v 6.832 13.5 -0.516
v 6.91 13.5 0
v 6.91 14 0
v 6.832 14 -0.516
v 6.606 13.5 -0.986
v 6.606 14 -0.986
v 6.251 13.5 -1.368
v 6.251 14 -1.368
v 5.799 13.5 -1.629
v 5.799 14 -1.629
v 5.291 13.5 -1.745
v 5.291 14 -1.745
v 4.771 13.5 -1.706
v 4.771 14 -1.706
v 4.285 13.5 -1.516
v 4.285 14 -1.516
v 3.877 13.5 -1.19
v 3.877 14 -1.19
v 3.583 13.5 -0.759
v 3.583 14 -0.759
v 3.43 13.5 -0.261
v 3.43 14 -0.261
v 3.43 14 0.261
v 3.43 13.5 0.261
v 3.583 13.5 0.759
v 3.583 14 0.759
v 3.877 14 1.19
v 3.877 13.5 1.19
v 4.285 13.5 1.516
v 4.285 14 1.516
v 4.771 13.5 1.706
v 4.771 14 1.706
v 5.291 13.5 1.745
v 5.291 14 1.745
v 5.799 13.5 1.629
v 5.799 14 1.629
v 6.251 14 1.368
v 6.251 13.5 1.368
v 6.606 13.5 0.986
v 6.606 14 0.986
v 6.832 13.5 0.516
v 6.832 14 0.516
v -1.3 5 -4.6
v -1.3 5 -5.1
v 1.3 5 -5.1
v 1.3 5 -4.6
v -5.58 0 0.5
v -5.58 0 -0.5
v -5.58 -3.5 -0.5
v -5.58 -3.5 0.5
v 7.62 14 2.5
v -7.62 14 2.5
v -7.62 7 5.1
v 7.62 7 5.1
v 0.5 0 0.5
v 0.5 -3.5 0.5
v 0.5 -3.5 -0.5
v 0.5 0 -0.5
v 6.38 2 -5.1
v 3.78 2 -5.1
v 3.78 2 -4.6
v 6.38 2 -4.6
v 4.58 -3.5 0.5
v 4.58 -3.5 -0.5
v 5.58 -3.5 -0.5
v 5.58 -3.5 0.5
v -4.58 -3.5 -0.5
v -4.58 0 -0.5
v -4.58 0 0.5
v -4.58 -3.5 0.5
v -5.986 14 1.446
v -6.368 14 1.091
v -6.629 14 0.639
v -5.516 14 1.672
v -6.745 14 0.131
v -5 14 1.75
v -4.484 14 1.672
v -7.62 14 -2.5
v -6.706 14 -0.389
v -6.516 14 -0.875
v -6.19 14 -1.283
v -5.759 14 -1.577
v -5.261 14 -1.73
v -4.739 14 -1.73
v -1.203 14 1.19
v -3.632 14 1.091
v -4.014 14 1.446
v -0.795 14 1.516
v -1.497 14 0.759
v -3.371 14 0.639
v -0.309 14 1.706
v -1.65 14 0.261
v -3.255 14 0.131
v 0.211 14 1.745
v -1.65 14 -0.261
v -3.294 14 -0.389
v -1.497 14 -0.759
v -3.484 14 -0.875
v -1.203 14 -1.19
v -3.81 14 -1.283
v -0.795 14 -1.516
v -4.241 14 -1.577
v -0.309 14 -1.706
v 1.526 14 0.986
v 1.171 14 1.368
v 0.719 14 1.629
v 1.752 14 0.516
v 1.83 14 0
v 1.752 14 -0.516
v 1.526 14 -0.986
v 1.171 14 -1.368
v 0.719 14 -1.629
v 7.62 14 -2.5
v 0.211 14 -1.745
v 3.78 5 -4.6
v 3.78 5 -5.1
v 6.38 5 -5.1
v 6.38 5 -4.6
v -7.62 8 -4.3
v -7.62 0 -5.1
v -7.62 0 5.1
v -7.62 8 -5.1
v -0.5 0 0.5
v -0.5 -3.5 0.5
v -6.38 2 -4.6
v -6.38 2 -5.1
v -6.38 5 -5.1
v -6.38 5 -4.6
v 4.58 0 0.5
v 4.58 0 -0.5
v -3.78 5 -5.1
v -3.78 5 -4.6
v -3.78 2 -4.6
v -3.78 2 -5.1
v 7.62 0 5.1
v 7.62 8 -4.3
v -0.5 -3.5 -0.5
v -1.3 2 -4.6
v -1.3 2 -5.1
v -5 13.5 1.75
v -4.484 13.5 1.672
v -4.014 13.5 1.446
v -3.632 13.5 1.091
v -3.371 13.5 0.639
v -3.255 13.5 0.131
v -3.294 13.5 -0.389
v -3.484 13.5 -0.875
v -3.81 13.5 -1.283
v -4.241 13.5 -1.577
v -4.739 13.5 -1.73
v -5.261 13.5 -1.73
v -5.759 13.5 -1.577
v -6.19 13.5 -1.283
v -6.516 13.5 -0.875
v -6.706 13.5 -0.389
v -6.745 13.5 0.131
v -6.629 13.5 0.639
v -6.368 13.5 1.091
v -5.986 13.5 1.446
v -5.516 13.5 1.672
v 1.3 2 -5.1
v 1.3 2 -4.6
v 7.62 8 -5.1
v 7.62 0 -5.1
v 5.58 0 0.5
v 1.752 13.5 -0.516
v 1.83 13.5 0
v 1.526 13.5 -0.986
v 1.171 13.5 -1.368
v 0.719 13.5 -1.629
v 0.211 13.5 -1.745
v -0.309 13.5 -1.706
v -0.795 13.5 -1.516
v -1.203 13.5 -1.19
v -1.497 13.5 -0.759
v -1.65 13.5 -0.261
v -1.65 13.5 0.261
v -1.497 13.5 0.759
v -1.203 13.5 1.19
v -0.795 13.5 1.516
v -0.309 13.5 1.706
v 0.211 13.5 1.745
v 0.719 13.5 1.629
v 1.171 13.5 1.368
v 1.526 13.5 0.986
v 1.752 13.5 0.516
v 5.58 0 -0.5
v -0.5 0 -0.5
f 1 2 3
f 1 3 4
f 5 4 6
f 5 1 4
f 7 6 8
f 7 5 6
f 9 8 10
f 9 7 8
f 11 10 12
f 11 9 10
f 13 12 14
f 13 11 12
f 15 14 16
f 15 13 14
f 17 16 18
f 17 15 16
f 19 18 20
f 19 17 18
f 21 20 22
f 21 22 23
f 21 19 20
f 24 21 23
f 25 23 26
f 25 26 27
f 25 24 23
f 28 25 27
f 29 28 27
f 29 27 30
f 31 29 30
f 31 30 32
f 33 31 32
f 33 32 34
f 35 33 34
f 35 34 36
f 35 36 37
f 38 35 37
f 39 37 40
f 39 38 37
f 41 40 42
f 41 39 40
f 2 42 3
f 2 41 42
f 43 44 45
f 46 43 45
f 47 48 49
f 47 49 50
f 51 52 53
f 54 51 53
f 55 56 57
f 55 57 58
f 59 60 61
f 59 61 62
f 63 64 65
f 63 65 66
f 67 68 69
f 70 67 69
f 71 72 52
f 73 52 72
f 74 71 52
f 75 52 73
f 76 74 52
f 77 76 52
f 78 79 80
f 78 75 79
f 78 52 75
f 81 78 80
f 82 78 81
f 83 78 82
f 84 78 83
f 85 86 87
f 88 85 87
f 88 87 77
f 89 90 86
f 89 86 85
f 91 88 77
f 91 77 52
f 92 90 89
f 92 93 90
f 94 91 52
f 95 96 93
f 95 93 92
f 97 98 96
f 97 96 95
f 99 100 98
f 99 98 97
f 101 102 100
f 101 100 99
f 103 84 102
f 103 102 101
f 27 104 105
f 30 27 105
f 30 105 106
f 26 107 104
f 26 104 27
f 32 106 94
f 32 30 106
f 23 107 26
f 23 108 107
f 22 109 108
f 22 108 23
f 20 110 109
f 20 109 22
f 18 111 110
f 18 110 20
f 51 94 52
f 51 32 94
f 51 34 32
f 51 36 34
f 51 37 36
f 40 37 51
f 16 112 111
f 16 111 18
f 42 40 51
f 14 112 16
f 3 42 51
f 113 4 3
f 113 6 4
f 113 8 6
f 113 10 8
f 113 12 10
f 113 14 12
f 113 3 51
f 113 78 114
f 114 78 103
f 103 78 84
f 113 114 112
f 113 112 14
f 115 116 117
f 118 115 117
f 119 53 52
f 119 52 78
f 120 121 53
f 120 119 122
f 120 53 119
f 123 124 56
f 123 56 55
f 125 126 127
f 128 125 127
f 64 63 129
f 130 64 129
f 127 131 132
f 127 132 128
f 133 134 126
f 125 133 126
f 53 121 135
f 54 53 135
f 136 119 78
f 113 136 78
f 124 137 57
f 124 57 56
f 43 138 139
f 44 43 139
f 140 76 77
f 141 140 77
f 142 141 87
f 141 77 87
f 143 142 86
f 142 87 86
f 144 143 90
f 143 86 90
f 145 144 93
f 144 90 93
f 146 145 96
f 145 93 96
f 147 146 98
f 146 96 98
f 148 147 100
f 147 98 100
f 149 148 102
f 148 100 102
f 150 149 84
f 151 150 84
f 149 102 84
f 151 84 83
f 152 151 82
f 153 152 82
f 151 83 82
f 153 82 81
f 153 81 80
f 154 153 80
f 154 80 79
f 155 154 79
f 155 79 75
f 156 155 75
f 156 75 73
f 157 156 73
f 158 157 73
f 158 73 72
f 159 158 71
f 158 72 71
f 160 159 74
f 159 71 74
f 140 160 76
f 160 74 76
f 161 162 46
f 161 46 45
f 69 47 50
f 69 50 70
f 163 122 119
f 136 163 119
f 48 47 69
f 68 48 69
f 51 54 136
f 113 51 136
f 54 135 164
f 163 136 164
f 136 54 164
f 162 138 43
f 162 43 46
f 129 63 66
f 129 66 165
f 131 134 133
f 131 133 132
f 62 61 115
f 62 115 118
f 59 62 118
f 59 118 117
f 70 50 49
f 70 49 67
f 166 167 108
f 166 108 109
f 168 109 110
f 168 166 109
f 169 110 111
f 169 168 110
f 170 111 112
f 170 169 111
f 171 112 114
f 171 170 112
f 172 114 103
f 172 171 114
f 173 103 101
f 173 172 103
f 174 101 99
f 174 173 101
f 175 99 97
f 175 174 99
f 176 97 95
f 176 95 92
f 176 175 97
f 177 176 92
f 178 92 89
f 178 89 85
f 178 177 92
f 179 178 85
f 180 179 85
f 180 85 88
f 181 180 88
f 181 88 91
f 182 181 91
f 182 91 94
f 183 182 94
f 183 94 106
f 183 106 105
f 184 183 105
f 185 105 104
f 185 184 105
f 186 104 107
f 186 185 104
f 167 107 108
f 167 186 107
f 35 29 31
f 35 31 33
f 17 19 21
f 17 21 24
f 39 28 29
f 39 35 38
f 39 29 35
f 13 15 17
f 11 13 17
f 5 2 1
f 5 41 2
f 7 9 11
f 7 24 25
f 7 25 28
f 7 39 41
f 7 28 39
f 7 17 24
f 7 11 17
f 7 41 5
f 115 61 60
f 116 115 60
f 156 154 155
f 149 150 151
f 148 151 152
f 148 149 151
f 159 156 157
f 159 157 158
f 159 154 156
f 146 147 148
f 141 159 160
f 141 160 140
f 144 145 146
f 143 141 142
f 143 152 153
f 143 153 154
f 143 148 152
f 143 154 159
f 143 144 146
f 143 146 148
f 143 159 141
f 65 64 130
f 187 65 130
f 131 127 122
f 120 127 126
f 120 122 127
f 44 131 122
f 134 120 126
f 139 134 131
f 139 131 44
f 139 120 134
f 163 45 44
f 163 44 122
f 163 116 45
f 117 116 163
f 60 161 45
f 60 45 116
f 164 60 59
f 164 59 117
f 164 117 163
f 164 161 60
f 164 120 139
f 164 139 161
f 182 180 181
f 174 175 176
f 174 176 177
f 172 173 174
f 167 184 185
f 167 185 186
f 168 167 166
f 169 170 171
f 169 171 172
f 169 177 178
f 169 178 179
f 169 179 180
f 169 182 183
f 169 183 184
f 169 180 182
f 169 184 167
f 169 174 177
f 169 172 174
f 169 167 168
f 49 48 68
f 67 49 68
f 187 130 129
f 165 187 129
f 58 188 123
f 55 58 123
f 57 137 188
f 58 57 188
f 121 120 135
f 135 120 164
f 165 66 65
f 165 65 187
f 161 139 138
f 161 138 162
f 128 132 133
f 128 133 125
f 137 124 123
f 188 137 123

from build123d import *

# Parameters (mm, degrees)
SKETCH3_W             = 15.24
SKETCH3_H             = 10.2
BOSS_EXTRUDE3_DEPTH   = 14
CUT_EXTRUDE1_DEPTH    = 22.313554373
SKETCH5_R             = 1.75
CUT_EXTRUDE2_DEPTH    = 0.5
SKETCH6_W             = 2.6
SKETCH6_H             = 3
CUT_EXTRUDE4_DEPTH    = 0.5
SKETCH7_W             = 1
SKETCH7_H             = 1
BOSS_EXTRUDE4_DEPTH   = 3.5
LPATTERN2_START       = 4.58
LPATTERN2_OUTLINE_W   = 3.5
LPATTERN2_OUTLINE_H   = 1
LPATTERN2_DEPTH       = 1
LPATTERN2_START_2     = -0.5
LPATTERN2_2_OUTLINE_W = 3.5
LPATTERN2_2_OUTLINE_H = 1
LPATTERN2_2_DEPTH     = 1
LPATTERN2_START_3     = 13.5
LPATTERN2_3_OUTLINE_R = 1.75
LPATTERN2_3_DEPTH     = 0.5
LPATTERN2_START_4     = 2
LPATTERN2_4_OUTLINE_W = 2.6
LPATTERN2_4_OUTLINE_H = 0.5
LPATTERN2_4_DEPTH     = 3


# Read off the part's stored shape, not the designer's step: LPattern2
with BuildPart() as part:
    # Sketch3 → Boss-Extrude3 (new body)
    with BuildSketch(Plane(origin=(0, 0, 0), x_dir=(1, 0, 0), z_dir=(0, 1, 0))):
        Rectangle(SKETCH3_W, SKETCH3_H)
    extrude(amount=BOSS_EXTRUDE3_DEPTH)

    # Sketch4 → Cut-Extrude1 (cut, through all)
    with BuildSketch(Plane.ZY.offset(7.62)):
        Polygon((-4.3, 8), (-2.5, 14), (-4.3, 14), (-5.1, 14), (-5.1, 8), align=None)
        Polygon((5.1, 14), (2.5, 14), (5.1, 7), align=None)
    extrude(amount=-CUT_EXTRUDE1_DEPTH, mode=Mode.SUBTRACT)

    # Sketch5 → Cut-Extrude2 (cut)
    with BuildSketch(Plane(origin=(0, 14, 0), x_dir=(1, 0, 0), z_dir=(0, 1, 0))):
        with Locations(Location((-5, 0, 0), (0, 0, 270))):
            Circle(SKETCH5_R)
    extrude(amount=-CUT_EXTRUDE2_DEPTH, mode=Mode.SUBTRACT)

    # Sketch6 → Cut-Extrude4 (cut)
    with BuildSketch(Plane(origin=(0, 0, -5.1), x_dir=(-1, 0, 0), z_dir=(0, 0, -1))):
        with Locations((5.08, 3.5)):
            Rectangle(SKETCH6_W, SKETCH6_H)
    extrude(amount=-CUT_EXTRUDE4_DEPTH, mode=Mode.SUBTRACT)

    # LPattern2 3 outline → LPattern2 3 (cut)
    with BuildSketch(Plane(origin=(0, 0, 0), x_dir=(1, 0, 0), z_dir=(0, 1, 0)).offset(LPATTERN2_START_3)):
        with Locations((5.16, 0)):
            Circle(LPATTERN2_3_OUTLINE_R)
        with Locations((0.08, 0)):
            Circle(LPATTERN2_3_OUTLINE_R)
    extrude(amount=LPATTERN2_3_DEPTH, mode=Mode.SUBTRACT)

    # LPattern2 4 outline → LPattern2 4 (cut)
    with BuildSketch(Plane(origin=(0, 0, 0), x_dir=(1, 0, 0), z_dir=(0, 1, 0)).offset(LPATTERN2_START_4)):
        with Locations((0, 4.85)):
            Rectangle(LPATTERN2_4_OUTLINE_W, LPATTERN2_4_OUTLINE_H)
        with Locations((5.08, 4.85)):
            Rectangle(LPATTERN2_4_OUTLINE_W, LPATTERN2_4_OUTLINE_H)
    extrude(amount=LPATTERN2_4_DEPTH, mode=Mode.SUBTRACT)


with BuildPart() as body_2:
    # Sketch7 → Boss-Extrude4 (new body)
    with BuildSketch(Plane.XZ):
        with Locations((-5.08, 0)):
            Rectangle(SKETCH7_W, SKETCH7_H)
    extrude(amount=BOSS_EXTRUDE4_DEPTH)


with BuildPart() as body_3:
    # LPattern2 outline → LPattern2 (new body)
    with BuildSketch(Plane.YZ.offset(LPATTERN2_START)):
        with Locations((-1.75, 0)):
            Rectangle(LPATTERN2_OUTLINE_W, LPATTERN2_OUTLINE_H)
    extrude(amount=LPATTERN2_DEPTH)


with BuildPart() as body_4:
    # LPattern2 2 outline → LPattern2 2 (new body)
    with BuildSketch(Plane.YZ.offset(LPATTERN2_START_2)):
        with Locations((-1.75, 0)):
            Rectangle(LPATTERN2_2_OUTLINE_W, LPATTERN2_2_OUTLINE_H)
    extrude(amount=LPATTERN2_2_DEPTH)


solid = Compound([part.part, body_2.part, body_3.part, body_4.part])
